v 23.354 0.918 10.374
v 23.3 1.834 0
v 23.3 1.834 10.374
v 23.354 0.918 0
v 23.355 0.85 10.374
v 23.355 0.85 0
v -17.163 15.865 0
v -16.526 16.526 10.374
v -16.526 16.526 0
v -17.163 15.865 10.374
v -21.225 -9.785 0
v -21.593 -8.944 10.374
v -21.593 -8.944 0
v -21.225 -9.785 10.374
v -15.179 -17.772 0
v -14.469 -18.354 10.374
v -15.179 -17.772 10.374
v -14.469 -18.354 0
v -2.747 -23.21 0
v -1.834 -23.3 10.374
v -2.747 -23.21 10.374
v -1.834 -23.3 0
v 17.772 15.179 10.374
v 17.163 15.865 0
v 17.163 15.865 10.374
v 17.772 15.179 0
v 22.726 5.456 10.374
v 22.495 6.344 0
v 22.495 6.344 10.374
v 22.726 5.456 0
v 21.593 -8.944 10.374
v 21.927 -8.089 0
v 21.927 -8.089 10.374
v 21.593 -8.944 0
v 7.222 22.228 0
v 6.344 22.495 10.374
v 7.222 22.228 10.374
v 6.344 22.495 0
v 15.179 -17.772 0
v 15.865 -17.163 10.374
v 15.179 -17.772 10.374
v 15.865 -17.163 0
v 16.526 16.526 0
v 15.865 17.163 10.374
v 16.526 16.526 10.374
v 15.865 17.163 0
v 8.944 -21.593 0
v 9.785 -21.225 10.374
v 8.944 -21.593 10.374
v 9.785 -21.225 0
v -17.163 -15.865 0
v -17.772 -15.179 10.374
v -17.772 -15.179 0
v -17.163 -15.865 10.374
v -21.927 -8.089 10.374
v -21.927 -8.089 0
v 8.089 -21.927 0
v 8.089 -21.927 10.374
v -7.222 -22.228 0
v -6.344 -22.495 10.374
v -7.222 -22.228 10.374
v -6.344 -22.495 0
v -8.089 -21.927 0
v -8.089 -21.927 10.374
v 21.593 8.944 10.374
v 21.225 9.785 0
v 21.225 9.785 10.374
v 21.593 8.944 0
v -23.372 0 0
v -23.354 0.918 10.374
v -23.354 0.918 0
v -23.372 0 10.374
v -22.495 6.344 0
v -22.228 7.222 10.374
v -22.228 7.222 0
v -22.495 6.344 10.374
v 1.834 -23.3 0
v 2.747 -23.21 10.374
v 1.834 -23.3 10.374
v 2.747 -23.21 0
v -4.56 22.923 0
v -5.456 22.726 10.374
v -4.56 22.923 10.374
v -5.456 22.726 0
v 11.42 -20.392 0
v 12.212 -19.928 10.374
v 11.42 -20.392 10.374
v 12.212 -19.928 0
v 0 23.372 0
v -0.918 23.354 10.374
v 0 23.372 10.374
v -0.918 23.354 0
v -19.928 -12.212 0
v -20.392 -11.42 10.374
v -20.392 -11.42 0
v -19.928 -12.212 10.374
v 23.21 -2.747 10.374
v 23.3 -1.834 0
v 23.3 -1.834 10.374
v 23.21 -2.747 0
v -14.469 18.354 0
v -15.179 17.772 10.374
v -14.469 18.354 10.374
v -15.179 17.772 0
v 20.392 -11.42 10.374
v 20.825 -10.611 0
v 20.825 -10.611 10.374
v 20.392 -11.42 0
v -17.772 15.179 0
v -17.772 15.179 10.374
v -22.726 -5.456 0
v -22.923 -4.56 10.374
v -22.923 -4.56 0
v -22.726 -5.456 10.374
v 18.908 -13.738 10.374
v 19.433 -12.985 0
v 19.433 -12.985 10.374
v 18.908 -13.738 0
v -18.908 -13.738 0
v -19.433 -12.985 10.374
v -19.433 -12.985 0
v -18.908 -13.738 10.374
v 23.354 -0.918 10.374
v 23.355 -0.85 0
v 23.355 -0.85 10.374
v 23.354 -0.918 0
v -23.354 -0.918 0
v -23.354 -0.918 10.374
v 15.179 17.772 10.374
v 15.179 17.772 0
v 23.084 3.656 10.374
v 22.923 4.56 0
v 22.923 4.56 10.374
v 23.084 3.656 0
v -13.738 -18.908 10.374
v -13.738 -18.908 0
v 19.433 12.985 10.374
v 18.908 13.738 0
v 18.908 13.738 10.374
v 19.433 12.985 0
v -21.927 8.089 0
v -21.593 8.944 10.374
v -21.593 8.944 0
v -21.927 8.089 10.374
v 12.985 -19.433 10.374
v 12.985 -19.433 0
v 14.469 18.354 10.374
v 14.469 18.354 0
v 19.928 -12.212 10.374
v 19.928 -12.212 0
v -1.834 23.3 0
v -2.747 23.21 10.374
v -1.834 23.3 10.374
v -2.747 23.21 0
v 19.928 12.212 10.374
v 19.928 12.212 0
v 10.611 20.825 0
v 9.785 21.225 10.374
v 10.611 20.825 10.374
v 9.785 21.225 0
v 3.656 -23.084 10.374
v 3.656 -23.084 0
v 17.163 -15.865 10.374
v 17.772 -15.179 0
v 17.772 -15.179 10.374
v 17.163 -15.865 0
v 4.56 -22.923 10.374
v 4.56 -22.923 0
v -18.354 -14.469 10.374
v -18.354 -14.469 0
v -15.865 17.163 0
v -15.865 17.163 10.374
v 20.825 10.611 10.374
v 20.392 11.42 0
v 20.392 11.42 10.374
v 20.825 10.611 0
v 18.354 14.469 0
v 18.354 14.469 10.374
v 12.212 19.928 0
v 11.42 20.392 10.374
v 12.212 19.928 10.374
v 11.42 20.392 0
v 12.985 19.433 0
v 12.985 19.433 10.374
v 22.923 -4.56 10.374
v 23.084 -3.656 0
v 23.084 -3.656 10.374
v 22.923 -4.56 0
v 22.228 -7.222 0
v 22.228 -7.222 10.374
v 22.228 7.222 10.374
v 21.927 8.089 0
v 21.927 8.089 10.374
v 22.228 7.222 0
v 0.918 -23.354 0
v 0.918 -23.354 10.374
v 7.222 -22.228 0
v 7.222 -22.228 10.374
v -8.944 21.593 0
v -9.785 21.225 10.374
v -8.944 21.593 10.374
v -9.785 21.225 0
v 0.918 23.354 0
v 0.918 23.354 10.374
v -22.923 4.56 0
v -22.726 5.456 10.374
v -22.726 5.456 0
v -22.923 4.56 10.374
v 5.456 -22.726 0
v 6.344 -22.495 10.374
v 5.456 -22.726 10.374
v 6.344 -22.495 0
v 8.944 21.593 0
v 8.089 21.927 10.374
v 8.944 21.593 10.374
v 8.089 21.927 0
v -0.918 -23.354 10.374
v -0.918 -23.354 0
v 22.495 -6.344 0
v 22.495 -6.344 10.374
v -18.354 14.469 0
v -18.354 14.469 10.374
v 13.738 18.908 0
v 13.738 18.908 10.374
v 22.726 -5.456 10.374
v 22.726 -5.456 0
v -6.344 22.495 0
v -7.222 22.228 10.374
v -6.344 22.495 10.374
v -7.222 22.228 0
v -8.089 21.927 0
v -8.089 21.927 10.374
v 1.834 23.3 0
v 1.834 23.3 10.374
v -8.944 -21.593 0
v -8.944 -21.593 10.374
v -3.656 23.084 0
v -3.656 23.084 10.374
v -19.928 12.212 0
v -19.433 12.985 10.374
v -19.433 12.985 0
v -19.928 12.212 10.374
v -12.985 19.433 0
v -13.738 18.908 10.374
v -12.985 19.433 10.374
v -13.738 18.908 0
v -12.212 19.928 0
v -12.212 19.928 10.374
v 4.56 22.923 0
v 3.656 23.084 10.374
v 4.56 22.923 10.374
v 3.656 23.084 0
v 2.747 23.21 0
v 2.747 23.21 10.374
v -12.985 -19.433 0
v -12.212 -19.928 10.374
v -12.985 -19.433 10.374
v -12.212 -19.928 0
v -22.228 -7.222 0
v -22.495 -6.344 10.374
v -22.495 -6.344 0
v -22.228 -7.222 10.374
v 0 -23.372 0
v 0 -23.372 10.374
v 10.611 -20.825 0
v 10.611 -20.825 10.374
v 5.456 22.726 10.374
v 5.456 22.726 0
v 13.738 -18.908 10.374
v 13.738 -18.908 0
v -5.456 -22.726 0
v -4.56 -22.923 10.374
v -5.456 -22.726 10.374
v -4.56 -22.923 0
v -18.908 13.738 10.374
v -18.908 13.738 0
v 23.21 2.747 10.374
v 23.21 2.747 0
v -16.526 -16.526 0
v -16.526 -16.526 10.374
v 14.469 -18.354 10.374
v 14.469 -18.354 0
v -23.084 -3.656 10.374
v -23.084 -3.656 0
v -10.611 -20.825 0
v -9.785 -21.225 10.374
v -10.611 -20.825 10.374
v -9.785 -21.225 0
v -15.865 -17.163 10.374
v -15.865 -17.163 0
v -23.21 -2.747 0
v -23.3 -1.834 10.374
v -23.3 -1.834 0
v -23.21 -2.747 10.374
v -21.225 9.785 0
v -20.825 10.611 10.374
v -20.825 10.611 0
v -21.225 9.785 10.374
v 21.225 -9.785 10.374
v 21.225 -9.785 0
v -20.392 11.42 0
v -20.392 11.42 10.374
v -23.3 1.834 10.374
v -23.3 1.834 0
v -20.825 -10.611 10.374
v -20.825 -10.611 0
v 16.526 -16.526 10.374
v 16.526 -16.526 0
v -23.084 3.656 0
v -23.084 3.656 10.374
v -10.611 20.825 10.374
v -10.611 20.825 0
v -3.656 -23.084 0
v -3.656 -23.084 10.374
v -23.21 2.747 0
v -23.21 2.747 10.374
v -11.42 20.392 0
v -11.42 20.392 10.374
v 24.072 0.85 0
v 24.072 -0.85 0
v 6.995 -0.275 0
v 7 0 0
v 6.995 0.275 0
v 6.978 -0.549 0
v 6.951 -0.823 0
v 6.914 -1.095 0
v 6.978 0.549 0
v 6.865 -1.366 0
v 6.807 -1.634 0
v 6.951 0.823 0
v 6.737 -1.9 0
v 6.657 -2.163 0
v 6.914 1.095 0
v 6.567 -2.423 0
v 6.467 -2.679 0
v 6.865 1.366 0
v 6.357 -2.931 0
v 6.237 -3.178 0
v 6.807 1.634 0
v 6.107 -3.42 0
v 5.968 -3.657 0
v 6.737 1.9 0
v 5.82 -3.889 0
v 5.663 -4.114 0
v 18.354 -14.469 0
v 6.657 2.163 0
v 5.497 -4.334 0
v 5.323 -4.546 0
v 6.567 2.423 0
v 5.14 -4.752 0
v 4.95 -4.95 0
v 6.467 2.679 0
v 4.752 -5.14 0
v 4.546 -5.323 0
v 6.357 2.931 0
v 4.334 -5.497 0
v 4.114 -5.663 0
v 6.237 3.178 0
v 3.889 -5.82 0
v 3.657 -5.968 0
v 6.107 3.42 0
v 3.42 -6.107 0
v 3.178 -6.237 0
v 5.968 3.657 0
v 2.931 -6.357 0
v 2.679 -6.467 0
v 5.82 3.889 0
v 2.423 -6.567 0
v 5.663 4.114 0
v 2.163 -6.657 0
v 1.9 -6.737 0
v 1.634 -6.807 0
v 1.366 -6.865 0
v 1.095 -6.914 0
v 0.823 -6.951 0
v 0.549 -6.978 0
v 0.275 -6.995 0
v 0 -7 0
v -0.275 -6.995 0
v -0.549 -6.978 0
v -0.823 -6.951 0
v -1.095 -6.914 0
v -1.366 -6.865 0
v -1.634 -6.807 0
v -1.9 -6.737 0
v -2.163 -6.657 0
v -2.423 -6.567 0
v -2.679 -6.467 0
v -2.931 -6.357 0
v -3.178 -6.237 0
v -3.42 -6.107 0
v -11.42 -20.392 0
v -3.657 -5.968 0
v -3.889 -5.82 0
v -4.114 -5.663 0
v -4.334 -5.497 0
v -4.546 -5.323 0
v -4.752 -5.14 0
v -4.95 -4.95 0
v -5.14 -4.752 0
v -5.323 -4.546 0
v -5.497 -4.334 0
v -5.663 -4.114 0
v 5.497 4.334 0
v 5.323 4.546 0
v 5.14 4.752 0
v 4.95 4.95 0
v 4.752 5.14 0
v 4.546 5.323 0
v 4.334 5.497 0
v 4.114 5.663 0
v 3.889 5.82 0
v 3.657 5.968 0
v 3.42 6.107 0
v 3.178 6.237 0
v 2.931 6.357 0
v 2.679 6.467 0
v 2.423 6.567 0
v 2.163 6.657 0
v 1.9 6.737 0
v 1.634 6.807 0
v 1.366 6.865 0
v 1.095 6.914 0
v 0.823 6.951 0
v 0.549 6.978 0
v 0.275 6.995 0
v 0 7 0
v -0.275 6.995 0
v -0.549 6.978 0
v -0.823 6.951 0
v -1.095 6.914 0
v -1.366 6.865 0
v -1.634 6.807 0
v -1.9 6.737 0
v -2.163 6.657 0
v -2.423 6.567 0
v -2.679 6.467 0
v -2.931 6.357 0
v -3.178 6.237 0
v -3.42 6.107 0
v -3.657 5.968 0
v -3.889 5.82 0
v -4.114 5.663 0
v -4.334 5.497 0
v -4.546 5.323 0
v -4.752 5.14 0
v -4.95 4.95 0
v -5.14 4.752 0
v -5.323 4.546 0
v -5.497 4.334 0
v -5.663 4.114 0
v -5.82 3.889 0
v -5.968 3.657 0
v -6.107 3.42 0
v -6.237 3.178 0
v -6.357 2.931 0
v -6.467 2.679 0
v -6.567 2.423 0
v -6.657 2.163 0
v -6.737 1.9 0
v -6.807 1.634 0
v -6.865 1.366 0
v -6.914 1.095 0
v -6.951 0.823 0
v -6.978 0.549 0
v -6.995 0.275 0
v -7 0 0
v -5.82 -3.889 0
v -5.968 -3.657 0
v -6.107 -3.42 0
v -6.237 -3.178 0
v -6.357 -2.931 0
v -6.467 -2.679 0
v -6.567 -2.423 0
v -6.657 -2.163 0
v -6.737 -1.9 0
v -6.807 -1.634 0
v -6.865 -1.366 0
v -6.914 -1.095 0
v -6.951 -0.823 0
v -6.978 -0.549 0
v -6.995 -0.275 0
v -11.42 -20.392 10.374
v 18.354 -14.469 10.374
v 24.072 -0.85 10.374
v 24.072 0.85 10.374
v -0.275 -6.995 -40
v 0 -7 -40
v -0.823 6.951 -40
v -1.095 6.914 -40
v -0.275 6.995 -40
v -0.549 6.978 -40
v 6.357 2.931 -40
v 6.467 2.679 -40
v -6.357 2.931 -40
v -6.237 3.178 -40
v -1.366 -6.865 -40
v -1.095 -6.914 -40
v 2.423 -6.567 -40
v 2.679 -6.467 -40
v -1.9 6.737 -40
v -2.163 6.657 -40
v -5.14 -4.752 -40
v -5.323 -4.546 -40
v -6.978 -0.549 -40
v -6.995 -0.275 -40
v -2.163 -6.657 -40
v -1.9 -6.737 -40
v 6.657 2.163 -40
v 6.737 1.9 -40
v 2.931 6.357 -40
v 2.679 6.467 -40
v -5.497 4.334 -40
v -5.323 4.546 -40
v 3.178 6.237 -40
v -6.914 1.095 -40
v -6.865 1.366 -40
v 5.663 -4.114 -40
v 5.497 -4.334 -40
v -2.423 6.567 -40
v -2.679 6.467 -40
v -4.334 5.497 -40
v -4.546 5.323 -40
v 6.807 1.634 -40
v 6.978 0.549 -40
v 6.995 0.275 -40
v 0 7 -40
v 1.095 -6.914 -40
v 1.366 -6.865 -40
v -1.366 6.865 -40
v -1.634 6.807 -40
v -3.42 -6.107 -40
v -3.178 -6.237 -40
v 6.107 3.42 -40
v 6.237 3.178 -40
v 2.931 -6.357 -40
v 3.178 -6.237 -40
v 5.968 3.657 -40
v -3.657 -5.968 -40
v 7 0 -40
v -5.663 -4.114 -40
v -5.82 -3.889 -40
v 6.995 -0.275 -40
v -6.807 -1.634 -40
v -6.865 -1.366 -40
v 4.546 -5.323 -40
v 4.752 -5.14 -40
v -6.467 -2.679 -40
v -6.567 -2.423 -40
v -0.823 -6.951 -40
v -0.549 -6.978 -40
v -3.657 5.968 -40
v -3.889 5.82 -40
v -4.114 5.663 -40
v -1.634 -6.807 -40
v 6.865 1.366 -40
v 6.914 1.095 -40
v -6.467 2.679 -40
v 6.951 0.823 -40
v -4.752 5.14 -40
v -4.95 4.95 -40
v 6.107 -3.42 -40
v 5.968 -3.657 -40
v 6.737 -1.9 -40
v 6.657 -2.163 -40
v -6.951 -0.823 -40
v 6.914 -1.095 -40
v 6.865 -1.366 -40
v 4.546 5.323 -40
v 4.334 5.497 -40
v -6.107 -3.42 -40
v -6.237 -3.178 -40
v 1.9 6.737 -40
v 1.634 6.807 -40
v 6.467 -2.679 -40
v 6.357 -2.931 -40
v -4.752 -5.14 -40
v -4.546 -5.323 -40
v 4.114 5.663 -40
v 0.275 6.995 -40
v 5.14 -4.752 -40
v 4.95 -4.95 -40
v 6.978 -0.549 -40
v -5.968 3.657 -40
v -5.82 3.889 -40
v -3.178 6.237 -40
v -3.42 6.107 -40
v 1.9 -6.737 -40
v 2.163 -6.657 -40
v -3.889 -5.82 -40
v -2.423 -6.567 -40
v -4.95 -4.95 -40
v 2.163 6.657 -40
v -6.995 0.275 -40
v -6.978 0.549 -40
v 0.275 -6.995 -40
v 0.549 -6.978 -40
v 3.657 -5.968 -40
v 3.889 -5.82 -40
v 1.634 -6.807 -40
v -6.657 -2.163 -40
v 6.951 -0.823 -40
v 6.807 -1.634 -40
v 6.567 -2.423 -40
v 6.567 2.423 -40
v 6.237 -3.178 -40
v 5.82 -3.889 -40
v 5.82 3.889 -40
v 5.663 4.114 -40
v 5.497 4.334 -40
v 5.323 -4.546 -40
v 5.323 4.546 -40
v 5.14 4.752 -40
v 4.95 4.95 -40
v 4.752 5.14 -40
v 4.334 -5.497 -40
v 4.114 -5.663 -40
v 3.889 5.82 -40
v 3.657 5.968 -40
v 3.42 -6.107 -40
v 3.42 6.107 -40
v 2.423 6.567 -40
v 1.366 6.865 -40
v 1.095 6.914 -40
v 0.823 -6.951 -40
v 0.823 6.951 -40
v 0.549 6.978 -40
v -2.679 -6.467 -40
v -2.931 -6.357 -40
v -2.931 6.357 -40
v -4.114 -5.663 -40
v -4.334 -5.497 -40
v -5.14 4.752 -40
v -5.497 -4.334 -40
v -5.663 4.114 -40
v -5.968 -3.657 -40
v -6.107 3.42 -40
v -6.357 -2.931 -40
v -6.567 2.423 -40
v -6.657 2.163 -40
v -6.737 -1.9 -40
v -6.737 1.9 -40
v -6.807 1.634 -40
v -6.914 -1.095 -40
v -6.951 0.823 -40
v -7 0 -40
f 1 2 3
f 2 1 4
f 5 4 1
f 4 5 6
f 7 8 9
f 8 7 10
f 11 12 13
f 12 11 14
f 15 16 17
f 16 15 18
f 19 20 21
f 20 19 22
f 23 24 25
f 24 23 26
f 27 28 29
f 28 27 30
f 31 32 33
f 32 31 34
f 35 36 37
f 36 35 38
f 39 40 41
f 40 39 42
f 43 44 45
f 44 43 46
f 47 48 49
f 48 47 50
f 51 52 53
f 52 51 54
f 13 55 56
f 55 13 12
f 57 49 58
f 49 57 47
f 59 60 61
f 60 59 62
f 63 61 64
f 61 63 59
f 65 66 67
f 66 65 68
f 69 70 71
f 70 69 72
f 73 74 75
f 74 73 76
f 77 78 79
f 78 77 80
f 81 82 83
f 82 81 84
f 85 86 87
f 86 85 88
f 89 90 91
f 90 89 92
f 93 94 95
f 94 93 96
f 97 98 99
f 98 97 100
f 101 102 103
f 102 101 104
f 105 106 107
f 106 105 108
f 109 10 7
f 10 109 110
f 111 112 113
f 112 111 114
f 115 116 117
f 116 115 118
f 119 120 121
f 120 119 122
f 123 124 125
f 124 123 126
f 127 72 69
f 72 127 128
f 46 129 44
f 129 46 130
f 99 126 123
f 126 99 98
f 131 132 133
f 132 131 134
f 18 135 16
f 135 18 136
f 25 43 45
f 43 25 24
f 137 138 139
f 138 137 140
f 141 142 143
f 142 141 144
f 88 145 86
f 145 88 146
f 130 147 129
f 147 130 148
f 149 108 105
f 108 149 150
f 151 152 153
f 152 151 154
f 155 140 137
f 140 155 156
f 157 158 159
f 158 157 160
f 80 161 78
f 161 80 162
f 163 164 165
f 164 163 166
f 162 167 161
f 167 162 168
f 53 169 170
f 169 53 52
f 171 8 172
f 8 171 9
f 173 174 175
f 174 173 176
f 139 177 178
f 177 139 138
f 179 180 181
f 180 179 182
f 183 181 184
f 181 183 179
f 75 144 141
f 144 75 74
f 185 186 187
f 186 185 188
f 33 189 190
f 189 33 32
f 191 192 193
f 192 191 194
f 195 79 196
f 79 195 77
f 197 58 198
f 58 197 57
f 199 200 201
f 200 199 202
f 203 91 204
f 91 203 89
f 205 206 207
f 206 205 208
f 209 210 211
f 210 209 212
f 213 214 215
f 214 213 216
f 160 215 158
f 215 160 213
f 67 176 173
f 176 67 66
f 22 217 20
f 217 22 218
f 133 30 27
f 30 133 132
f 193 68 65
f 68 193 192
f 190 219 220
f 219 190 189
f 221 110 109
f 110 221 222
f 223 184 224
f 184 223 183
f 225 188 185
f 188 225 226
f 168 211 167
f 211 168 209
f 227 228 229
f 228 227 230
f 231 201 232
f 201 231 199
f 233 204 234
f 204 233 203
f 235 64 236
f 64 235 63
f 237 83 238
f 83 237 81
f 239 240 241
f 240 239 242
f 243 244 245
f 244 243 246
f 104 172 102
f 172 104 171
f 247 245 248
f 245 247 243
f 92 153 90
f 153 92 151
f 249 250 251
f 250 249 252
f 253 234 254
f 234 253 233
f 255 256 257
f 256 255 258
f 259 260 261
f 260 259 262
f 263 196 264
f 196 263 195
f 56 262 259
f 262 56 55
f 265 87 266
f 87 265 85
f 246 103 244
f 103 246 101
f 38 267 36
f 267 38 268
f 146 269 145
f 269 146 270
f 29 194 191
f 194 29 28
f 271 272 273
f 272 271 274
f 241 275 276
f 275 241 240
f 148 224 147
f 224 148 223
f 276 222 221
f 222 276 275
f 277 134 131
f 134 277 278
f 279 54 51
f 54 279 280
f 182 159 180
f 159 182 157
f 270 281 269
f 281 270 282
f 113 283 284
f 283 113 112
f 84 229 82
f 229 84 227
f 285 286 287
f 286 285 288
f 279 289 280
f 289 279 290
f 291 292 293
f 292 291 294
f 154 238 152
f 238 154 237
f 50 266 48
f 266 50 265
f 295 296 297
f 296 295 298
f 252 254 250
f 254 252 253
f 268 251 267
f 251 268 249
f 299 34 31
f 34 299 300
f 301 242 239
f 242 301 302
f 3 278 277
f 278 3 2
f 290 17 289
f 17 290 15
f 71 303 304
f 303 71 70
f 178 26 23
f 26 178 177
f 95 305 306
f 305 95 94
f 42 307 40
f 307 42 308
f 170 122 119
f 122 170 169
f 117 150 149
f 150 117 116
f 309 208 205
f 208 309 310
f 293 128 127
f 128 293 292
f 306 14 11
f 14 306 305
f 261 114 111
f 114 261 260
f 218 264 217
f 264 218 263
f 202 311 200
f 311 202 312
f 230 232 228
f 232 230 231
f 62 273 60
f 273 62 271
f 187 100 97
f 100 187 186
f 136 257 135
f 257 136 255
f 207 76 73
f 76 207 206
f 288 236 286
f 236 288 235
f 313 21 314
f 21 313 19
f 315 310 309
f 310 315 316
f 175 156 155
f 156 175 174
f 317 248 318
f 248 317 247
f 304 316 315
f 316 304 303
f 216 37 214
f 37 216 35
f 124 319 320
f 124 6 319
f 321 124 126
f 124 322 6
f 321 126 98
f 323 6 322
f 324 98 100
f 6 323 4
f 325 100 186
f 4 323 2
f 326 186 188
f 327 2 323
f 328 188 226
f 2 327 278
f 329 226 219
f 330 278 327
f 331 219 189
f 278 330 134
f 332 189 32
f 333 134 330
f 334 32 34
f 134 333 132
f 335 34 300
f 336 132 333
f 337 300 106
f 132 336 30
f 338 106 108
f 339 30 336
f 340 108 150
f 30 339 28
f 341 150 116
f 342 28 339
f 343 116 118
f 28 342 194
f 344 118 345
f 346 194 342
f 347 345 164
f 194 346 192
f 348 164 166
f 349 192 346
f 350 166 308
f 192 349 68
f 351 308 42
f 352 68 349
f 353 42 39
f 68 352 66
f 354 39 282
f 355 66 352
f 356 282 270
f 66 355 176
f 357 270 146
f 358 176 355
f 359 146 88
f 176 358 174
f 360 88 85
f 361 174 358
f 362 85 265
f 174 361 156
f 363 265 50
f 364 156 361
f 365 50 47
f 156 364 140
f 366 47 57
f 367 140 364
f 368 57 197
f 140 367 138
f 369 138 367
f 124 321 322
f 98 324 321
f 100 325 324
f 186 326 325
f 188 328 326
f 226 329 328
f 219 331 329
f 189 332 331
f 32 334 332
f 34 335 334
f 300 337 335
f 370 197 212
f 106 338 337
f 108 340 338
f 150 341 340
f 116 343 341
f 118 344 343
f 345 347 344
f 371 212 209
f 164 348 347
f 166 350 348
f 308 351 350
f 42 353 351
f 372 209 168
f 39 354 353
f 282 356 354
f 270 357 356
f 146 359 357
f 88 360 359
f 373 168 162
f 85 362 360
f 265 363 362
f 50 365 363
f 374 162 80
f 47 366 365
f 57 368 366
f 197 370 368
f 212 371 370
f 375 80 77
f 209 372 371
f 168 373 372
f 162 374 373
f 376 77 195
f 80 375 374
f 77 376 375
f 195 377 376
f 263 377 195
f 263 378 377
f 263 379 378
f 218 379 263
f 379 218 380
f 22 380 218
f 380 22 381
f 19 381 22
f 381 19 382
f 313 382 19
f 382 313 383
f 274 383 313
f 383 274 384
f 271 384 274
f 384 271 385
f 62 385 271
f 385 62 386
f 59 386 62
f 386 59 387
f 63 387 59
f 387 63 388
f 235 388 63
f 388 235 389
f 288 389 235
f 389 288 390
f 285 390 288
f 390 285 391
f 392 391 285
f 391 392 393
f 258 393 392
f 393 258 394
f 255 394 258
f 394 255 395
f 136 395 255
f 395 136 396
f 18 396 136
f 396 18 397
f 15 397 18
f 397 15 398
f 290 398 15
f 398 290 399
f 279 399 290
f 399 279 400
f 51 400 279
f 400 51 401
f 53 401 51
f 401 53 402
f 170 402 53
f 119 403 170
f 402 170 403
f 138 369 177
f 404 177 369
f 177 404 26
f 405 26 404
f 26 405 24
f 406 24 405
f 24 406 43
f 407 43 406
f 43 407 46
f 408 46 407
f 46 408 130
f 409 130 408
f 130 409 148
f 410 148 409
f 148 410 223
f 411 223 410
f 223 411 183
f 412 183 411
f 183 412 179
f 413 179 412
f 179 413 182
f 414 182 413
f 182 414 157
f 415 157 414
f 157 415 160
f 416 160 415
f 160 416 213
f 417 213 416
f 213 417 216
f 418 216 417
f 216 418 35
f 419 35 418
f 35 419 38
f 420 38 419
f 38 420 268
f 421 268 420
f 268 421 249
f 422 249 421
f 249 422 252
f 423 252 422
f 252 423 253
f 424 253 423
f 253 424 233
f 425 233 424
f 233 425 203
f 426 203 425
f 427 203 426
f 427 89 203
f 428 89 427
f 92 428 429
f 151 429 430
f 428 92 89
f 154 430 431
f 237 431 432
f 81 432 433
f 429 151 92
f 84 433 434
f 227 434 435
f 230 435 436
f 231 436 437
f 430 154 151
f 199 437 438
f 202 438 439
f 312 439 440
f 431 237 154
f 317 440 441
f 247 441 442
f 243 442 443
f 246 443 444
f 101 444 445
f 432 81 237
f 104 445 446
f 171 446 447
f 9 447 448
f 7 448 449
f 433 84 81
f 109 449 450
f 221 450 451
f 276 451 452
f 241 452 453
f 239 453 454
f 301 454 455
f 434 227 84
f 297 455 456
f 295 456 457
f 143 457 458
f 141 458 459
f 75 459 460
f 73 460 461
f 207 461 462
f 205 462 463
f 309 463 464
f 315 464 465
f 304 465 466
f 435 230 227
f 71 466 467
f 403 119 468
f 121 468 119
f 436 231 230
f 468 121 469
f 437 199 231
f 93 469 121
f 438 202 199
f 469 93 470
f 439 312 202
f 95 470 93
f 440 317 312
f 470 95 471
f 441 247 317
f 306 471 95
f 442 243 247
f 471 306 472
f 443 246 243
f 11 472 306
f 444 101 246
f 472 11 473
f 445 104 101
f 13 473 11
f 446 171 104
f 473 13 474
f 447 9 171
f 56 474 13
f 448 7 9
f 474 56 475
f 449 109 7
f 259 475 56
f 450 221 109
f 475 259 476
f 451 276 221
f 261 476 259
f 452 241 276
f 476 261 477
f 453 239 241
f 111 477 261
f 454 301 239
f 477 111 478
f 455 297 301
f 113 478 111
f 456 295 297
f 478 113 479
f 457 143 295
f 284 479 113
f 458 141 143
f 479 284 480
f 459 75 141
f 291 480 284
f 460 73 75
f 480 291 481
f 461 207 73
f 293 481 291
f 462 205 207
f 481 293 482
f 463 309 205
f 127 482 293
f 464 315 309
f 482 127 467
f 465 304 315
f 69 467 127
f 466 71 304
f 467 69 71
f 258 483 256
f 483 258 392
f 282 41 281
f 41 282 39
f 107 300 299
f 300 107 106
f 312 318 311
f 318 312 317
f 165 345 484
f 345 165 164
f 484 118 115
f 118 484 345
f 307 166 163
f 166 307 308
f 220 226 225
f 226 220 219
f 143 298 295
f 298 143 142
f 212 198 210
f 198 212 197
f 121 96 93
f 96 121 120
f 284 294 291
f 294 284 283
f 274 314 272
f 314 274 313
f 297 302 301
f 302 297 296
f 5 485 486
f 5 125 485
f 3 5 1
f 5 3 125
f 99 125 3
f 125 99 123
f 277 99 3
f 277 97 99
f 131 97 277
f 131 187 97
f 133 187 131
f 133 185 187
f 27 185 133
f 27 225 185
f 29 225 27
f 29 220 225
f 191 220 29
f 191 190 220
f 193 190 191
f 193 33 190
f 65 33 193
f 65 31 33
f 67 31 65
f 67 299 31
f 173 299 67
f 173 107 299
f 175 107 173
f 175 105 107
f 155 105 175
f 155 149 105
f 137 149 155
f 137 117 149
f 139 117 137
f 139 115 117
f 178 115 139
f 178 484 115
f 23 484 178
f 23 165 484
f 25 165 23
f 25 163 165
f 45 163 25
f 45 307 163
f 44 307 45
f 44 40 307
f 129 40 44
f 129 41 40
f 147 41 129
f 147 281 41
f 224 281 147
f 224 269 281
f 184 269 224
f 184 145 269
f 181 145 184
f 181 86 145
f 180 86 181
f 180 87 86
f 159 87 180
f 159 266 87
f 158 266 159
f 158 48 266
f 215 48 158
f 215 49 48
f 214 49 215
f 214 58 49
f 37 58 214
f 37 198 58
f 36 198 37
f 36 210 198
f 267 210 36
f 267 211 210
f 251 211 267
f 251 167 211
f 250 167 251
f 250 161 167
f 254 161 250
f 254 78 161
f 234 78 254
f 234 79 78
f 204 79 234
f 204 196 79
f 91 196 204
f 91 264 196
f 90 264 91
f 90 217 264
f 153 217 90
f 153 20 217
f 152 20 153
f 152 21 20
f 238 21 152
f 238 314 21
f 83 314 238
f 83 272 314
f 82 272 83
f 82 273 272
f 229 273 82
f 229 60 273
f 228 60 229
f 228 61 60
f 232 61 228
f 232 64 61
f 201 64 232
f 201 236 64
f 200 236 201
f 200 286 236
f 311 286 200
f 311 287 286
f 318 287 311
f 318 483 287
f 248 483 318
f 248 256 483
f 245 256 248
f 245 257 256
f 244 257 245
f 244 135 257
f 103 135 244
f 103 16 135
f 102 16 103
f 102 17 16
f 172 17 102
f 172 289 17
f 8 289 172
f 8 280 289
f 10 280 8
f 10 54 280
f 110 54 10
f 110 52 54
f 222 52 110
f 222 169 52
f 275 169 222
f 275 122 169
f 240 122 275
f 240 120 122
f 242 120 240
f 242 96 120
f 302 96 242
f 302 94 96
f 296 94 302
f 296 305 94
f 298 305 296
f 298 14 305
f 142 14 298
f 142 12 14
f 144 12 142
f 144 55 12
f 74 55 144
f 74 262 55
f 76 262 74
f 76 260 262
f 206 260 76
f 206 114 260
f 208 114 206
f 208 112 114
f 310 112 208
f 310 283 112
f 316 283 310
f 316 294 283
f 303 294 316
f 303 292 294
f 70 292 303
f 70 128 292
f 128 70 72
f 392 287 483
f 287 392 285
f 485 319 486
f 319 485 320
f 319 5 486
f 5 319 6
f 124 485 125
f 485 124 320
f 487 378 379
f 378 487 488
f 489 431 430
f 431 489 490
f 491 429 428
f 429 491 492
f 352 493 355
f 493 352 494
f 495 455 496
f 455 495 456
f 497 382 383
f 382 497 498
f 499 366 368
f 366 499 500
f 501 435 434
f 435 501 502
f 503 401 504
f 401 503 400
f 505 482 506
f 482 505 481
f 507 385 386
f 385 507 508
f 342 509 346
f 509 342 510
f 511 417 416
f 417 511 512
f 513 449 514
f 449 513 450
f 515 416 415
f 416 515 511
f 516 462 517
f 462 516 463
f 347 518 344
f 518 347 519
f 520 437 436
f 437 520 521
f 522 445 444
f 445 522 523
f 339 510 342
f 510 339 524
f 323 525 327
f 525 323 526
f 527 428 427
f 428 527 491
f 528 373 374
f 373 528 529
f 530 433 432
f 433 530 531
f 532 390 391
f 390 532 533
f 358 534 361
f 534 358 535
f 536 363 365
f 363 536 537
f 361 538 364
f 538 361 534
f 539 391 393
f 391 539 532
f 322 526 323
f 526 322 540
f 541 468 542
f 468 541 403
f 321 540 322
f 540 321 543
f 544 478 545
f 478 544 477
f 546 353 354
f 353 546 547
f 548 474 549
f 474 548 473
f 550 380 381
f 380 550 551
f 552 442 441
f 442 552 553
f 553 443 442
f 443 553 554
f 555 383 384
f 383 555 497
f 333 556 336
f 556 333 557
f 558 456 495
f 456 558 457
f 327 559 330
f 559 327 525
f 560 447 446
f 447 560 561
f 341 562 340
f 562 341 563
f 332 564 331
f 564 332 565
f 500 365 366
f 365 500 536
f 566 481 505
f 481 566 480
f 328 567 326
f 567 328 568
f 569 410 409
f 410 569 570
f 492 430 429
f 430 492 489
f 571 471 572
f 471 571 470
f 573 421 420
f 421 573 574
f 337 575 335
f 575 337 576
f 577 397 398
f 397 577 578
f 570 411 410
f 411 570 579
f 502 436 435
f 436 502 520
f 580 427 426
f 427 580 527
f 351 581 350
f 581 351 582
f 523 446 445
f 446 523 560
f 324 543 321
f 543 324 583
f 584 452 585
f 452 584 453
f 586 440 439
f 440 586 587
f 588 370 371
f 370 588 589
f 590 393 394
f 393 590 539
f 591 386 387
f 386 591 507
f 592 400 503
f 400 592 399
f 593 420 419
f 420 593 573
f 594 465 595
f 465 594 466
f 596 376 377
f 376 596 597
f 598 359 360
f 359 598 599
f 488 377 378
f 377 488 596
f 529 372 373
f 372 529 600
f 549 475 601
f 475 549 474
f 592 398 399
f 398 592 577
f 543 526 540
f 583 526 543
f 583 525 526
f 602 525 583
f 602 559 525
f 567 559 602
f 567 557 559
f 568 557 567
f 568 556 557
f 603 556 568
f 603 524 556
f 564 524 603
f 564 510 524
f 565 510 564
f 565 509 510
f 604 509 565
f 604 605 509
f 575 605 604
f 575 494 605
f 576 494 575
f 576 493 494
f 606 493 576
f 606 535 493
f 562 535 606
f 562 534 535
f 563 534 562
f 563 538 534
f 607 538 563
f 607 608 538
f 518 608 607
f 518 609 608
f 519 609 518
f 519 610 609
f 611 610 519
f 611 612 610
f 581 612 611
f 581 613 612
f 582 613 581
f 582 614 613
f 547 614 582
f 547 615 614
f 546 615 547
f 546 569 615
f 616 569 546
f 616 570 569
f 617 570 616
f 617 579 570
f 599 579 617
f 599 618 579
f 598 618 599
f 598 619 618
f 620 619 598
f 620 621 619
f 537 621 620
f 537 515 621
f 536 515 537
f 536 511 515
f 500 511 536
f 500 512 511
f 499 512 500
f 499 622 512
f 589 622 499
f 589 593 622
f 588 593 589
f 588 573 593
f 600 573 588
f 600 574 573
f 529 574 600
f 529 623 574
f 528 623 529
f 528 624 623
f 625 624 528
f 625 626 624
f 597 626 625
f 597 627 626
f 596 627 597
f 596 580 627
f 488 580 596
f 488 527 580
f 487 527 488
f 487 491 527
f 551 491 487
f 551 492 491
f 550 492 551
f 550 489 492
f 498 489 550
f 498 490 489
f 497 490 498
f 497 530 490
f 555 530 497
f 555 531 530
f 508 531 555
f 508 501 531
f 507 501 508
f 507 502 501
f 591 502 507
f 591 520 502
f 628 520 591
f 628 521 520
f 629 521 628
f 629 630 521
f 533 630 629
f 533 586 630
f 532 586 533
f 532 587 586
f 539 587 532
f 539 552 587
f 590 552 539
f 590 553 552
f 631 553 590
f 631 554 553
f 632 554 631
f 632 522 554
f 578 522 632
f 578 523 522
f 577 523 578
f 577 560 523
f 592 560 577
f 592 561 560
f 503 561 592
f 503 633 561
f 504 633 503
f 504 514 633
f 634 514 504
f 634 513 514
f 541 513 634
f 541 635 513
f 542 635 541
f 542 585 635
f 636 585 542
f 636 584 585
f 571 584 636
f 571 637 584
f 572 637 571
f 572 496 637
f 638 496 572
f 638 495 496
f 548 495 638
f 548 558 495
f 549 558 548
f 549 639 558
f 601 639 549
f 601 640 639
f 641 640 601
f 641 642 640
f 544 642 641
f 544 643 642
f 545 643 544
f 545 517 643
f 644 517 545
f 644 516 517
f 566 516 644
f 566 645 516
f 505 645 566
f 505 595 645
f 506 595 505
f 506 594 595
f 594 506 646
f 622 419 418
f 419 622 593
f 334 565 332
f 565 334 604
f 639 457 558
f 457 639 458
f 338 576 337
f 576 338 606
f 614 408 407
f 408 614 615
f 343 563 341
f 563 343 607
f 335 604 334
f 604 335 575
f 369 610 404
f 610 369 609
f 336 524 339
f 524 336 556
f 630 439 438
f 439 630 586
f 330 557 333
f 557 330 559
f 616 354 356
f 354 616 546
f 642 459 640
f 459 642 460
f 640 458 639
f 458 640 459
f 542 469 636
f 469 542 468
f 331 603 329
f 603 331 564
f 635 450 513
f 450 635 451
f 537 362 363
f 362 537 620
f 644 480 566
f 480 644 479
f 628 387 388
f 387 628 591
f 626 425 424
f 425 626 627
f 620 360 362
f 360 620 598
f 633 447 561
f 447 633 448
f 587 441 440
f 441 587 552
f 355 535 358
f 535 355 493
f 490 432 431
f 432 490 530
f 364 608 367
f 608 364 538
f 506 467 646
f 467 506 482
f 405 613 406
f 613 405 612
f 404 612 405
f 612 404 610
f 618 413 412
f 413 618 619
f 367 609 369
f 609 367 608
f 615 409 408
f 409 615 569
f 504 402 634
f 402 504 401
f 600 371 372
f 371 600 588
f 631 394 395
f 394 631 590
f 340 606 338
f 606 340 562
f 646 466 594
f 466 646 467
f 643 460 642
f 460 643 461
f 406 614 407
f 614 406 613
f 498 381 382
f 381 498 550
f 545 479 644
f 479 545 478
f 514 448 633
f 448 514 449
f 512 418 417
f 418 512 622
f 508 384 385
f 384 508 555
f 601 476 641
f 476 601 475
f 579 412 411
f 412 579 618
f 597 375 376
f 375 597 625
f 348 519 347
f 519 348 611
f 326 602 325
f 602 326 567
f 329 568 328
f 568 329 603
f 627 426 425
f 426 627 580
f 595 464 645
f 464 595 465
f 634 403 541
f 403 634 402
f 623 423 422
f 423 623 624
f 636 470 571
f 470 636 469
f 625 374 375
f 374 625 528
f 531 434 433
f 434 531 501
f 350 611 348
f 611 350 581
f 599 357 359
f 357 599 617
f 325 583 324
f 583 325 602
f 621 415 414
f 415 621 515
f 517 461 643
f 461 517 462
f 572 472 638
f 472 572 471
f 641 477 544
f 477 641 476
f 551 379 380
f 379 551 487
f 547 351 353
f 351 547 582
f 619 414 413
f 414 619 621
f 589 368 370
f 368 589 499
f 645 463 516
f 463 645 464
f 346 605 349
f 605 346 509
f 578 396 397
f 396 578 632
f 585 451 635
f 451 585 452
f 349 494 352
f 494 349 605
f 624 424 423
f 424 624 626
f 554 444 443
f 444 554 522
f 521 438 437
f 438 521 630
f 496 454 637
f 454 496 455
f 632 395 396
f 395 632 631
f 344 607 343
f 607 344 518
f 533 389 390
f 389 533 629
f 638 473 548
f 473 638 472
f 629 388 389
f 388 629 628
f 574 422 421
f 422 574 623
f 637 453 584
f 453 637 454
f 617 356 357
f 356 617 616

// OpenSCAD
// file: motor_lib.scad
// Biblioteca del motor DronSwarm (M6). Las medidas vienen de <dron>_motor_params.scad (generado). Unidades: mm.
// Sin hull/minkowski (CLAUDE.md): todo con cilindros, polígonos y extrusiones.
$fn = 160;

// ---------- láser ----------
module stator_lamination_2d() {           // lámina del estator: 0.2 mm de acero al silicio (NO20)
    difference() {
        circle(r = r_s);
        circle(r = r_bore);
        for (s = slots) polygon(s);
        translate([r_bore - 0.01, -1.0]) square([1.2, 2.0]);                 // chaveta: alinea las láminas y fija al tubo
    }
}
module rotor_ring_2d() {                  // anillo del rotor: acero común 1 mm, se apilan n_ring
    difference() {
        circle(r = r_out);
        circle(r = r_mag_out + fit_slide / 2);
        translate([r_mag_out, -0.75]) square([0.8, 1.5]);                     // marca de orientación (polo 1)
    }
}

// ---------- impresas ----------
module cap() {                            // tapa: lleva la hélice y el eje; el anillo del rotor entra 2 mm en la ranura
    hub_r = shaft / 2 + 3.5;
    difference() {
        union() {
            cylinder(r = r_out + 1.2, h = cap_t);
            translate([0, 0, -2]) difference() {                                 // pollera que abraza el anillo
                cylinder(r = r_out + 1.2, h = 2);
                translate([0, 0, -0.1]) cylinder(r = r_out + print_clear / 2, h = 2.2);
            }
            cylinder(r = hub_r, h = cap_t + 4);                                  // cubo del eje
        }
        translate([0, 0, -1]) cylinder(d = shaft + fit_press, h = cap_t + 6);   // eje a presión
        translate([0, 0, cap_t + 2]) rotate([0, 90, 0]) cylinder(d = 2.6, h = hub_r + 1);   // prisionero M3
        for (i = [0 : prop_n - 1]) rotate(360 / prop_n * i + 45)
            translate([prop_pcd / 2, 0, -1]) cylinder(d = prop_bolt, h = cap_t + 6);
        for (i = [0 : prop_n - 1]) rotate(360 / prop_n * i)                      // ventilación entre los tornillos de la hélice
            translate([0, 0, -1]) linear_extrude(cap_t + 2)
                polygon([[ (hub_r + 2) * cos(-14), (hub_r + 2) * sin(-14)], [ (r_mag_in - 3) * cos(-18), (r_mag_in - 3) * sin(-18)],
                         [ (r_mag_in - 3) * cos(18), (r_mag_in - 3) * sin(18)], [ (hub_r + 2) * cos(14), (hub_r + 2) * sin(14)]]);
    }
}

module base() {                           // base: tubo con los 2 rodamientos, sostiene el estator, se atornilla al DMI
    tube_h = l_stack + 2 * overhang + 1;
    difference() {
        union() {
            cylinder(r = max(r_bore + 5, dmi_pcd / 2 + 4), h = base_t);
            cylinder(r = r_bore + fit_press / 2, h = base_t + tube_h);               // el estator se pega sobre el tubo
            translate([r_bore - 0.2, -0.9, base_t]) cube([1.0, 1.8, tube_h]);        // chaveta (entra en la muesca de las láminas)
        }
        translate([0, 0, -1]) cylinder(d = bearing_od + fit_press, h = bearing_w + 1);                  // rodamiento inferior
        translate([0, 0, base_t + tube_h - bearing_w]) cylinder(d = bearing_od + fit_press, h = bearing_w + 1); // superior
        translate([0, 0, -1]) cylinder(d = shaft + 1.0, h = base_t + tube_h + 2);
        for (i = [0 : dmi_n - 1]) rotate(360 / dmi_n * i + 45) translate([dmi_pcd / 2, 0, -1]) cylinder(d = dmi_bolt, h = base_t + 2);
        translate([r_bore - 4, -2, -1]) cube([6, 4, base_t + 2]);                 // salida de los 3 cables de fase
    }
}

module magnet_jig() {                     // peine: se mete dentro del anillo y deja cada imán en su lugar (paso de polo exacto)
    rib = 2 * PI * r_mag_in / poles - magnet_w;      // espacio entre imanes en el diámetro interior
    difference() {
        union() {
            cylinder(r = r_mag_in - 0.15, h = l_stack + 4);
            for (i = [0 : poles - 1]) rotate(360 / poles * (i + 0.5))
                translate([r_mag_in - 0.5, -max(rib, 0.6) / 2, 0]) cube([h_magnet + 0.3, max(rib, 0.6) - 0.15, l_stack + 4]);
        }
        translate([0, 0, -1]) cylinder(r = r_mag_in - 3, h = l_stack + 6);
    }
}

module stack_mandrel() {                  // mandril de apilado: alinea las láminas por el agujero y la chaveta mientras cura el adhesivo
    difference() {
        union() {
            cylinder(r = r_bore - 0.05, h = l_stack + 10);
            translate([r_bore - 0.3, -0.9, 0]) cube([1.0, 1.8, l_stack + 10]);
            cylinder(r = r_s + 3, h = 3);
        }
        translate([0, 0, -1]) cylinder(d = 5.5, h = l_stack + 12);                // varilla roscada M5 para prensar
    }
}

module winding_holder() {                 // soporte para bobinar a mano: sujeta el estator por el agujero, con mango
    union() {
        cylinder(r = r_bore - 0.1, h = l_stack + 2);
        translate([r_bore - 0.4, -0.85, 0]) cube([1.0, 1.7, l_stack + 2]);
        translate([0, 0, -40]) cylinder(r = 7, h = 40);
    }
}

// ---------- ensamble (para ver) ----------
module assembly() {
    color("#b0b0b0") translate([0, 0, base_t + overhang]) linear_extrude(l_stack) stator_lamination_2d();
    color("#b87333") for (s = slots) translate([0, 0, base_t + 0.5]) linear_extrude(l_stack + 2 * overhang - 1) offset(r = -0.35) polygon(s);
    color("#4a4a4a") translate([0, 0, base_t + overhang - 1]) linear_extrude(l_stack + 2) rotor_ring_2d();
    color("#2a78d6") for (i = [0 : poles - 1]) rotate(360 / poles * i)
        translate([0, 0, base_t + overhang]) rotate_extrude(angle = 360 / poles * pole_arc)
            translate([r_mag_in, 0]) square([h_magnet, l_stack]);
    color("#eb6834") translate([0, 0, base_t + 2 * overhang + l_stack + 1]) cap();
    color("#eb6834", 0.9) base();
    color("#dddddd") translate([0, 0, -6]) cylinder(d = shaft, h = base_t + 2 * overhang + l_stack + cap_t + 14);
}
// main file
// DS-D · soporte_bobinado (M6). Generado por motor/fabricacion/gen_cad.py
include <ds_d_motor_params.scad>
include <motor_lib.scad>
winding_holder();
